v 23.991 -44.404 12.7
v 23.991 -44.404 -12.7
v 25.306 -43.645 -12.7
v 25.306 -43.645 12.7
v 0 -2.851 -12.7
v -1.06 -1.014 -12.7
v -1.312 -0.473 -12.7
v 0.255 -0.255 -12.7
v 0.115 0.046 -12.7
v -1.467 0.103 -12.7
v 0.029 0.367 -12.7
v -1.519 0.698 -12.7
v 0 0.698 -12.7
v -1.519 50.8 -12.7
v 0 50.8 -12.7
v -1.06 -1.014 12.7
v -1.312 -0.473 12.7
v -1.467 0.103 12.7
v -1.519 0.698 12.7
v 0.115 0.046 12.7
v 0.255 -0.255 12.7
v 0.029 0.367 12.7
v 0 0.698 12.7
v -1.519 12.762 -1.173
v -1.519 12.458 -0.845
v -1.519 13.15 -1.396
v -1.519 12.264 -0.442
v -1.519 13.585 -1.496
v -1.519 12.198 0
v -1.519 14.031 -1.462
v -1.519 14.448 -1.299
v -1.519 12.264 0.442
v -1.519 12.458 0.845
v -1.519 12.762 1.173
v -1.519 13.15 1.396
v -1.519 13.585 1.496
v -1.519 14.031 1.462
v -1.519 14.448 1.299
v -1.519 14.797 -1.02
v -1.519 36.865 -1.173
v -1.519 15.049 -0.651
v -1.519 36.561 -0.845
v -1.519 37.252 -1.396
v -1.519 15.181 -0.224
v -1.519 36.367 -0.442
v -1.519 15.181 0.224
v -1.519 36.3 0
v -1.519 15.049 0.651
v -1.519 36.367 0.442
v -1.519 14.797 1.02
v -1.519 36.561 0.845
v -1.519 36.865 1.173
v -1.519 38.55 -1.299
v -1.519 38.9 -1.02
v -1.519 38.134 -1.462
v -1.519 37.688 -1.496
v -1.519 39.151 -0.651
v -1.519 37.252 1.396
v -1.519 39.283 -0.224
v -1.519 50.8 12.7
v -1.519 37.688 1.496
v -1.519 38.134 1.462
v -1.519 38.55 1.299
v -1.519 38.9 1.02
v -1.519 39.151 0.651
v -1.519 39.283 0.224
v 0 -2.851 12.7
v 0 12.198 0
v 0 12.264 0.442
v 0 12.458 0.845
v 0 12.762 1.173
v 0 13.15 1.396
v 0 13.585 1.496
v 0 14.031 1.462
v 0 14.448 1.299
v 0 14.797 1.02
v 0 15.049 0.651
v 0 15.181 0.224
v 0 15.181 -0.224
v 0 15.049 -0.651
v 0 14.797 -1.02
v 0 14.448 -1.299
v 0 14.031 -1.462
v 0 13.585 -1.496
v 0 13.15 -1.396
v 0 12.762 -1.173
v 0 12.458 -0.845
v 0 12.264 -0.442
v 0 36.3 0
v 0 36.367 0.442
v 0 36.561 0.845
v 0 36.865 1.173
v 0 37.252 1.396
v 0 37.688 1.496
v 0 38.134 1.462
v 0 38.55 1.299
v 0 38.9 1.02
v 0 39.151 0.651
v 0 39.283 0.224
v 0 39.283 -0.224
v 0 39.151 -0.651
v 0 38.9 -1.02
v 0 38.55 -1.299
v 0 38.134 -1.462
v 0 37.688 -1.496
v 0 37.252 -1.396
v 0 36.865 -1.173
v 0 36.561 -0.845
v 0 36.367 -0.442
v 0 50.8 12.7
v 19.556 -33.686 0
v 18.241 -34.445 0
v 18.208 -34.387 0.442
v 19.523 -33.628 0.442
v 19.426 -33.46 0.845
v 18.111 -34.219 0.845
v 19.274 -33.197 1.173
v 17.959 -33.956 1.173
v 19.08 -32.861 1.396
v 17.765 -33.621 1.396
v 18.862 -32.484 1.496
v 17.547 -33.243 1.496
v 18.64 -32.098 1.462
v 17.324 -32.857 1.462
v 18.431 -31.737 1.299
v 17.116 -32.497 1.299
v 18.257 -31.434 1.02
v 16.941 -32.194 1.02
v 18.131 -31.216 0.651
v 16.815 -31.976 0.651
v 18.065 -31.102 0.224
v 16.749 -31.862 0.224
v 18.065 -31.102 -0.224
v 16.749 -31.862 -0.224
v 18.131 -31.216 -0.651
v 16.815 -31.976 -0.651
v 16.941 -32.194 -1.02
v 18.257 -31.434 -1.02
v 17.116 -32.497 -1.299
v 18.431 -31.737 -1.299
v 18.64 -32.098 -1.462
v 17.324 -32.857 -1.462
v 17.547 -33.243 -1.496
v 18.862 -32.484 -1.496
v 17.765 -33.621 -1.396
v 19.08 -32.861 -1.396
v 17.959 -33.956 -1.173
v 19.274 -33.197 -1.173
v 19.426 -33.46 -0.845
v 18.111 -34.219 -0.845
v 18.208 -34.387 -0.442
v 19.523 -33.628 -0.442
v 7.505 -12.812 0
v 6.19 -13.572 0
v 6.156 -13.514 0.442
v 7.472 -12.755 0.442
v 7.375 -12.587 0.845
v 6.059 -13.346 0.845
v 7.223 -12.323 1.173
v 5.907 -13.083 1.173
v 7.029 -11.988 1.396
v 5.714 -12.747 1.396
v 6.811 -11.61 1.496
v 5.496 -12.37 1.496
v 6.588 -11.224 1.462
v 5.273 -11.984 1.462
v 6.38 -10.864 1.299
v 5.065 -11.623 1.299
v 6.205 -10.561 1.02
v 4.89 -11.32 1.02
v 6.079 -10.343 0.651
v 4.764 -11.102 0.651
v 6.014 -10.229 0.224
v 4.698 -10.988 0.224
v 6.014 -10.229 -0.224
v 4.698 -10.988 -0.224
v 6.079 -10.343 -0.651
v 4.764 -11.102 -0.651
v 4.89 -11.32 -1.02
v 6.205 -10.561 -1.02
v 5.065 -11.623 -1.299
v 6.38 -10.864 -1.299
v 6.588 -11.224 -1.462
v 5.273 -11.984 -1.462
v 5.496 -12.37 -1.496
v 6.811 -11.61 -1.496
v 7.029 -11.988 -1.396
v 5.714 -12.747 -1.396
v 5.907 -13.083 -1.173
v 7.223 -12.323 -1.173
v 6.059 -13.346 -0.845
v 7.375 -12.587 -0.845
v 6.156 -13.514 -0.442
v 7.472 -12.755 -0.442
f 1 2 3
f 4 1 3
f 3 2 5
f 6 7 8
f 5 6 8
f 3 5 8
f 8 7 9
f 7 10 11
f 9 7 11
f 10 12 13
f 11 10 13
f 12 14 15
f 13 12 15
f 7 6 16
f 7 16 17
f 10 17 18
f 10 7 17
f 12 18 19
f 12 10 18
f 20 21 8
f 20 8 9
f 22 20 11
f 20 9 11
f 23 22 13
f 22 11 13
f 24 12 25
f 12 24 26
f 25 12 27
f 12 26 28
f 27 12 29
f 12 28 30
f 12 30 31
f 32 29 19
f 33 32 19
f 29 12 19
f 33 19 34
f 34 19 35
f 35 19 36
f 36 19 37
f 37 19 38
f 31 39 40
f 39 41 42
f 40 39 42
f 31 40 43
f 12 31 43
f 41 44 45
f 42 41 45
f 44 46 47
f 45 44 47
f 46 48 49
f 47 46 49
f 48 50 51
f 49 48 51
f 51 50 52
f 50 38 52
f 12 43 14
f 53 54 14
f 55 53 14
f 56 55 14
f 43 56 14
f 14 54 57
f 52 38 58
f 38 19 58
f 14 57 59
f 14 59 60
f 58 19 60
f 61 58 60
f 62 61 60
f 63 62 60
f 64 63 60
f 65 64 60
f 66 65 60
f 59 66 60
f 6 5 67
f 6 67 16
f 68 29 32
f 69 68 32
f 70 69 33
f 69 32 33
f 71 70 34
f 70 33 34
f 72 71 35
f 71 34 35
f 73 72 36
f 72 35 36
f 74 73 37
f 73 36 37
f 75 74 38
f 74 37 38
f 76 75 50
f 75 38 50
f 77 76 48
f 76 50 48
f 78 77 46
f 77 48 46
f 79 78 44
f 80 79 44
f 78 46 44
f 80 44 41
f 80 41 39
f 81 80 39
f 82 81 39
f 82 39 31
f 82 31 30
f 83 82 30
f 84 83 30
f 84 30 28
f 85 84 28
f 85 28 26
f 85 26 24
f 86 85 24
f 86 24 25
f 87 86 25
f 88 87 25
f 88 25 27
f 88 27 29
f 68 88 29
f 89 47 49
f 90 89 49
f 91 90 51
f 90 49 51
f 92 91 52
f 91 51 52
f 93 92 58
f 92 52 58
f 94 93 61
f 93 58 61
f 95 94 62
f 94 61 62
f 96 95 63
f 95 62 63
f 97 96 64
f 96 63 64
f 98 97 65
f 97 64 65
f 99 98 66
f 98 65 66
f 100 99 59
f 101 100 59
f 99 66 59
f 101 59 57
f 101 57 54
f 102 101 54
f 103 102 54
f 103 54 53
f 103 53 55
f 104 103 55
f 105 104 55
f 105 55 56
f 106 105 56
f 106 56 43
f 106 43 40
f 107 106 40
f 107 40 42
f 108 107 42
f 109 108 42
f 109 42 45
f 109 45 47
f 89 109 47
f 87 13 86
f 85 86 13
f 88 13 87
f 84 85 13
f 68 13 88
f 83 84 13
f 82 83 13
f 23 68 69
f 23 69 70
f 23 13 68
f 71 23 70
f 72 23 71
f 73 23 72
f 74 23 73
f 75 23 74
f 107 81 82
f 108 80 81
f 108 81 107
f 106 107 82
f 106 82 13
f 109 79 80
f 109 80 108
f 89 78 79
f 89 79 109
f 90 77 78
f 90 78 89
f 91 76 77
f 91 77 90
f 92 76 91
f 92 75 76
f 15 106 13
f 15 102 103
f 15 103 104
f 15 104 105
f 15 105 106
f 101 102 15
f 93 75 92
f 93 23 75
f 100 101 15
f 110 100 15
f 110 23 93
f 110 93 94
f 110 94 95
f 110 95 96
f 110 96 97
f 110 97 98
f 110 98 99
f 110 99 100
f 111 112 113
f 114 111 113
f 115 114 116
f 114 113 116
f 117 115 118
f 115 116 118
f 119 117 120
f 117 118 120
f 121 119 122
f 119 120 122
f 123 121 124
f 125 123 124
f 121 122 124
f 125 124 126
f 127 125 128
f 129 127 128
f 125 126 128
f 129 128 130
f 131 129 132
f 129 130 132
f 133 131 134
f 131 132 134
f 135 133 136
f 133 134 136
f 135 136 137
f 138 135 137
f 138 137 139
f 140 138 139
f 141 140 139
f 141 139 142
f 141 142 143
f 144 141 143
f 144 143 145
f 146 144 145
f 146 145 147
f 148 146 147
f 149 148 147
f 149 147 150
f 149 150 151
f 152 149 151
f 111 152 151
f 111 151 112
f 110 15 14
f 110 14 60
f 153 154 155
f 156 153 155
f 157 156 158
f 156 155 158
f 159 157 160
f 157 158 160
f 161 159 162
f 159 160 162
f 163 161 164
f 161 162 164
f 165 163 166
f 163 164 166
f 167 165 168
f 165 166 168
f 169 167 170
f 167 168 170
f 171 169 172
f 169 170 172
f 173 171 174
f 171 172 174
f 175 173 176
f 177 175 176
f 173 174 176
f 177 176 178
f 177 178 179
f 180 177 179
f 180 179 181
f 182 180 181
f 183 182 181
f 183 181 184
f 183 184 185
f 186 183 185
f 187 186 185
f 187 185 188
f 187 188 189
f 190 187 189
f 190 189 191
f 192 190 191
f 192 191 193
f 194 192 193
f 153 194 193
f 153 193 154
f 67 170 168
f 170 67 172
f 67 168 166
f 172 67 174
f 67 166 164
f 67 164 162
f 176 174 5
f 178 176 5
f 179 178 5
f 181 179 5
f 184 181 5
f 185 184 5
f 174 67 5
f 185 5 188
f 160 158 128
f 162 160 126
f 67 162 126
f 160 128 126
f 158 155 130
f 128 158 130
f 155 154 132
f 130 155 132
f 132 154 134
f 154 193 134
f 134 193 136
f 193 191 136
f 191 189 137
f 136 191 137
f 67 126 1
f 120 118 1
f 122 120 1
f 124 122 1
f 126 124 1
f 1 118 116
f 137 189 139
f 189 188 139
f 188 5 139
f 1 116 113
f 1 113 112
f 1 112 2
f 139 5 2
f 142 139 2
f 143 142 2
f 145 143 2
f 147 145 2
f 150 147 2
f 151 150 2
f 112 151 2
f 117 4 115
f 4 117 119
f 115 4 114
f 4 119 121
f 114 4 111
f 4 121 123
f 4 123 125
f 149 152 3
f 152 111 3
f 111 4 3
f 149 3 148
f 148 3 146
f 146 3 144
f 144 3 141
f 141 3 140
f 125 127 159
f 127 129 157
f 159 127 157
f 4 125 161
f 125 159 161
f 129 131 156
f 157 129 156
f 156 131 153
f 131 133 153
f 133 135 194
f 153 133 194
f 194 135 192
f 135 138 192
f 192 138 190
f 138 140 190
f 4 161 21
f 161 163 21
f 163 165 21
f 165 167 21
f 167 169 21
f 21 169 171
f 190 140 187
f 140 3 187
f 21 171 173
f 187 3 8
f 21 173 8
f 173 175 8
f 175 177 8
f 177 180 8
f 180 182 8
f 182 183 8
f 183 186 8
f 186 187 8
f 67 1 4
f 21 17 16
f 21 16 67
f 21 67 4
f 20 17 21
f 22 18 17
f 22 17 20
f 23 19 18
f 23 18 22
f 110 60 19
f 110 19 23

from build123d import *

# Parameters (mm, degrees)
SKETCH1_W                = 101.6
SKETCH1_H                = 25.4
BASE_FLANGE1_DEPTH       = 1.51892
SKETCHED_START           = -12.7
SKETCHED_BEND1_DEPTH     = 25.4
SKETCHED_BEND1_2_DEPTH   = 25.4
F_3_0_3_DIAMETER_HOLE1_D = 3
F_3_0_3_DIAMETER_HOLE2_D = 3


# Read off the part's stored shape, not the designer's step: Sketched Bend1
# Sheet-metal steps are written as plain solids
with BuildPart() as part:
    # Sketch1 → Base-Flange1 (new body)
    with BuildSketch(Plane.YZ):
        Rectangle(SKETCH1_W, SKETCH1_H)
    extrude(amount=-BASE_FLANGE1_DEPTH)

    # Sketched Bend1 outline → Sketched Bend1 (cut)
    with BuildSketch(Plane.XY.offset(SKETCHED_START)):
        with BuildLine():
            Line((0, -2.850729215), (-1.060201701, -1.014406003))
            ThreePointArc((-1.060201701, -1.014406003), (-1.402252755, -0.188621708), (-1.51892, 0.697553997))
            Line((-1.51892, 0.697553997), (-1.51892, -50.8))
            Line((-1.51892, -50.8), (0, -50.8))
            Line((0, -50.8), (0, -2.850729215))
        make_face()
    extrude(amount=SKETCHED_BEND1_DEPTH, mode=Mode.SUBTRACT)

    # Sketched Bend1 2 outline → Sketched Bend1 2 (add)
    with BuildSketch(Plane.XY.offset(SKETCHED_START)):
        with BuildLine():
            Line((0, 0.697553997), (0, -2.850729215))
            Line((0, -2.850729215), (23.991021301, -44.404397034))
            Line((23.991021301, -44.404397034), (25.306444607, -43.644937034))
            Line((25.306444607, -43.644937034), (0.255221606, -0.254946003))
            ThreePointArc((0.255221606, -0.254946003), (0.064911301, 0.204503716), (0, 0.697553997))
        make_face()
    extrude(amount=SKETCHED_BEND1_2_DEPTH)

    # Ø3.0 (3) Diameter Hole1 (through all)
    with Locations(Plane(origin=(0.081021347, 0.046777696, 0), x_dir=(-0.500000000000001, 0.866025403784438, 0), z_dir=(0.866025403784438, 0.500000000000001, 0))):
        with Locations((-37.450846521, 0), (-13.348400518, 0)):
            Hole(F_3_0_3_DIAMETER_HOLE1_D / 2)

    # Ø3.0 (3) Diameter Hole2 (through all)
    with Locations(Plane.YZ):
        with Locations((13.697553997, 0), (37.8, 0)):
            Hole(F_3_0_3_DIAMETER_HOLE2_D / 2)


solid = part.part
